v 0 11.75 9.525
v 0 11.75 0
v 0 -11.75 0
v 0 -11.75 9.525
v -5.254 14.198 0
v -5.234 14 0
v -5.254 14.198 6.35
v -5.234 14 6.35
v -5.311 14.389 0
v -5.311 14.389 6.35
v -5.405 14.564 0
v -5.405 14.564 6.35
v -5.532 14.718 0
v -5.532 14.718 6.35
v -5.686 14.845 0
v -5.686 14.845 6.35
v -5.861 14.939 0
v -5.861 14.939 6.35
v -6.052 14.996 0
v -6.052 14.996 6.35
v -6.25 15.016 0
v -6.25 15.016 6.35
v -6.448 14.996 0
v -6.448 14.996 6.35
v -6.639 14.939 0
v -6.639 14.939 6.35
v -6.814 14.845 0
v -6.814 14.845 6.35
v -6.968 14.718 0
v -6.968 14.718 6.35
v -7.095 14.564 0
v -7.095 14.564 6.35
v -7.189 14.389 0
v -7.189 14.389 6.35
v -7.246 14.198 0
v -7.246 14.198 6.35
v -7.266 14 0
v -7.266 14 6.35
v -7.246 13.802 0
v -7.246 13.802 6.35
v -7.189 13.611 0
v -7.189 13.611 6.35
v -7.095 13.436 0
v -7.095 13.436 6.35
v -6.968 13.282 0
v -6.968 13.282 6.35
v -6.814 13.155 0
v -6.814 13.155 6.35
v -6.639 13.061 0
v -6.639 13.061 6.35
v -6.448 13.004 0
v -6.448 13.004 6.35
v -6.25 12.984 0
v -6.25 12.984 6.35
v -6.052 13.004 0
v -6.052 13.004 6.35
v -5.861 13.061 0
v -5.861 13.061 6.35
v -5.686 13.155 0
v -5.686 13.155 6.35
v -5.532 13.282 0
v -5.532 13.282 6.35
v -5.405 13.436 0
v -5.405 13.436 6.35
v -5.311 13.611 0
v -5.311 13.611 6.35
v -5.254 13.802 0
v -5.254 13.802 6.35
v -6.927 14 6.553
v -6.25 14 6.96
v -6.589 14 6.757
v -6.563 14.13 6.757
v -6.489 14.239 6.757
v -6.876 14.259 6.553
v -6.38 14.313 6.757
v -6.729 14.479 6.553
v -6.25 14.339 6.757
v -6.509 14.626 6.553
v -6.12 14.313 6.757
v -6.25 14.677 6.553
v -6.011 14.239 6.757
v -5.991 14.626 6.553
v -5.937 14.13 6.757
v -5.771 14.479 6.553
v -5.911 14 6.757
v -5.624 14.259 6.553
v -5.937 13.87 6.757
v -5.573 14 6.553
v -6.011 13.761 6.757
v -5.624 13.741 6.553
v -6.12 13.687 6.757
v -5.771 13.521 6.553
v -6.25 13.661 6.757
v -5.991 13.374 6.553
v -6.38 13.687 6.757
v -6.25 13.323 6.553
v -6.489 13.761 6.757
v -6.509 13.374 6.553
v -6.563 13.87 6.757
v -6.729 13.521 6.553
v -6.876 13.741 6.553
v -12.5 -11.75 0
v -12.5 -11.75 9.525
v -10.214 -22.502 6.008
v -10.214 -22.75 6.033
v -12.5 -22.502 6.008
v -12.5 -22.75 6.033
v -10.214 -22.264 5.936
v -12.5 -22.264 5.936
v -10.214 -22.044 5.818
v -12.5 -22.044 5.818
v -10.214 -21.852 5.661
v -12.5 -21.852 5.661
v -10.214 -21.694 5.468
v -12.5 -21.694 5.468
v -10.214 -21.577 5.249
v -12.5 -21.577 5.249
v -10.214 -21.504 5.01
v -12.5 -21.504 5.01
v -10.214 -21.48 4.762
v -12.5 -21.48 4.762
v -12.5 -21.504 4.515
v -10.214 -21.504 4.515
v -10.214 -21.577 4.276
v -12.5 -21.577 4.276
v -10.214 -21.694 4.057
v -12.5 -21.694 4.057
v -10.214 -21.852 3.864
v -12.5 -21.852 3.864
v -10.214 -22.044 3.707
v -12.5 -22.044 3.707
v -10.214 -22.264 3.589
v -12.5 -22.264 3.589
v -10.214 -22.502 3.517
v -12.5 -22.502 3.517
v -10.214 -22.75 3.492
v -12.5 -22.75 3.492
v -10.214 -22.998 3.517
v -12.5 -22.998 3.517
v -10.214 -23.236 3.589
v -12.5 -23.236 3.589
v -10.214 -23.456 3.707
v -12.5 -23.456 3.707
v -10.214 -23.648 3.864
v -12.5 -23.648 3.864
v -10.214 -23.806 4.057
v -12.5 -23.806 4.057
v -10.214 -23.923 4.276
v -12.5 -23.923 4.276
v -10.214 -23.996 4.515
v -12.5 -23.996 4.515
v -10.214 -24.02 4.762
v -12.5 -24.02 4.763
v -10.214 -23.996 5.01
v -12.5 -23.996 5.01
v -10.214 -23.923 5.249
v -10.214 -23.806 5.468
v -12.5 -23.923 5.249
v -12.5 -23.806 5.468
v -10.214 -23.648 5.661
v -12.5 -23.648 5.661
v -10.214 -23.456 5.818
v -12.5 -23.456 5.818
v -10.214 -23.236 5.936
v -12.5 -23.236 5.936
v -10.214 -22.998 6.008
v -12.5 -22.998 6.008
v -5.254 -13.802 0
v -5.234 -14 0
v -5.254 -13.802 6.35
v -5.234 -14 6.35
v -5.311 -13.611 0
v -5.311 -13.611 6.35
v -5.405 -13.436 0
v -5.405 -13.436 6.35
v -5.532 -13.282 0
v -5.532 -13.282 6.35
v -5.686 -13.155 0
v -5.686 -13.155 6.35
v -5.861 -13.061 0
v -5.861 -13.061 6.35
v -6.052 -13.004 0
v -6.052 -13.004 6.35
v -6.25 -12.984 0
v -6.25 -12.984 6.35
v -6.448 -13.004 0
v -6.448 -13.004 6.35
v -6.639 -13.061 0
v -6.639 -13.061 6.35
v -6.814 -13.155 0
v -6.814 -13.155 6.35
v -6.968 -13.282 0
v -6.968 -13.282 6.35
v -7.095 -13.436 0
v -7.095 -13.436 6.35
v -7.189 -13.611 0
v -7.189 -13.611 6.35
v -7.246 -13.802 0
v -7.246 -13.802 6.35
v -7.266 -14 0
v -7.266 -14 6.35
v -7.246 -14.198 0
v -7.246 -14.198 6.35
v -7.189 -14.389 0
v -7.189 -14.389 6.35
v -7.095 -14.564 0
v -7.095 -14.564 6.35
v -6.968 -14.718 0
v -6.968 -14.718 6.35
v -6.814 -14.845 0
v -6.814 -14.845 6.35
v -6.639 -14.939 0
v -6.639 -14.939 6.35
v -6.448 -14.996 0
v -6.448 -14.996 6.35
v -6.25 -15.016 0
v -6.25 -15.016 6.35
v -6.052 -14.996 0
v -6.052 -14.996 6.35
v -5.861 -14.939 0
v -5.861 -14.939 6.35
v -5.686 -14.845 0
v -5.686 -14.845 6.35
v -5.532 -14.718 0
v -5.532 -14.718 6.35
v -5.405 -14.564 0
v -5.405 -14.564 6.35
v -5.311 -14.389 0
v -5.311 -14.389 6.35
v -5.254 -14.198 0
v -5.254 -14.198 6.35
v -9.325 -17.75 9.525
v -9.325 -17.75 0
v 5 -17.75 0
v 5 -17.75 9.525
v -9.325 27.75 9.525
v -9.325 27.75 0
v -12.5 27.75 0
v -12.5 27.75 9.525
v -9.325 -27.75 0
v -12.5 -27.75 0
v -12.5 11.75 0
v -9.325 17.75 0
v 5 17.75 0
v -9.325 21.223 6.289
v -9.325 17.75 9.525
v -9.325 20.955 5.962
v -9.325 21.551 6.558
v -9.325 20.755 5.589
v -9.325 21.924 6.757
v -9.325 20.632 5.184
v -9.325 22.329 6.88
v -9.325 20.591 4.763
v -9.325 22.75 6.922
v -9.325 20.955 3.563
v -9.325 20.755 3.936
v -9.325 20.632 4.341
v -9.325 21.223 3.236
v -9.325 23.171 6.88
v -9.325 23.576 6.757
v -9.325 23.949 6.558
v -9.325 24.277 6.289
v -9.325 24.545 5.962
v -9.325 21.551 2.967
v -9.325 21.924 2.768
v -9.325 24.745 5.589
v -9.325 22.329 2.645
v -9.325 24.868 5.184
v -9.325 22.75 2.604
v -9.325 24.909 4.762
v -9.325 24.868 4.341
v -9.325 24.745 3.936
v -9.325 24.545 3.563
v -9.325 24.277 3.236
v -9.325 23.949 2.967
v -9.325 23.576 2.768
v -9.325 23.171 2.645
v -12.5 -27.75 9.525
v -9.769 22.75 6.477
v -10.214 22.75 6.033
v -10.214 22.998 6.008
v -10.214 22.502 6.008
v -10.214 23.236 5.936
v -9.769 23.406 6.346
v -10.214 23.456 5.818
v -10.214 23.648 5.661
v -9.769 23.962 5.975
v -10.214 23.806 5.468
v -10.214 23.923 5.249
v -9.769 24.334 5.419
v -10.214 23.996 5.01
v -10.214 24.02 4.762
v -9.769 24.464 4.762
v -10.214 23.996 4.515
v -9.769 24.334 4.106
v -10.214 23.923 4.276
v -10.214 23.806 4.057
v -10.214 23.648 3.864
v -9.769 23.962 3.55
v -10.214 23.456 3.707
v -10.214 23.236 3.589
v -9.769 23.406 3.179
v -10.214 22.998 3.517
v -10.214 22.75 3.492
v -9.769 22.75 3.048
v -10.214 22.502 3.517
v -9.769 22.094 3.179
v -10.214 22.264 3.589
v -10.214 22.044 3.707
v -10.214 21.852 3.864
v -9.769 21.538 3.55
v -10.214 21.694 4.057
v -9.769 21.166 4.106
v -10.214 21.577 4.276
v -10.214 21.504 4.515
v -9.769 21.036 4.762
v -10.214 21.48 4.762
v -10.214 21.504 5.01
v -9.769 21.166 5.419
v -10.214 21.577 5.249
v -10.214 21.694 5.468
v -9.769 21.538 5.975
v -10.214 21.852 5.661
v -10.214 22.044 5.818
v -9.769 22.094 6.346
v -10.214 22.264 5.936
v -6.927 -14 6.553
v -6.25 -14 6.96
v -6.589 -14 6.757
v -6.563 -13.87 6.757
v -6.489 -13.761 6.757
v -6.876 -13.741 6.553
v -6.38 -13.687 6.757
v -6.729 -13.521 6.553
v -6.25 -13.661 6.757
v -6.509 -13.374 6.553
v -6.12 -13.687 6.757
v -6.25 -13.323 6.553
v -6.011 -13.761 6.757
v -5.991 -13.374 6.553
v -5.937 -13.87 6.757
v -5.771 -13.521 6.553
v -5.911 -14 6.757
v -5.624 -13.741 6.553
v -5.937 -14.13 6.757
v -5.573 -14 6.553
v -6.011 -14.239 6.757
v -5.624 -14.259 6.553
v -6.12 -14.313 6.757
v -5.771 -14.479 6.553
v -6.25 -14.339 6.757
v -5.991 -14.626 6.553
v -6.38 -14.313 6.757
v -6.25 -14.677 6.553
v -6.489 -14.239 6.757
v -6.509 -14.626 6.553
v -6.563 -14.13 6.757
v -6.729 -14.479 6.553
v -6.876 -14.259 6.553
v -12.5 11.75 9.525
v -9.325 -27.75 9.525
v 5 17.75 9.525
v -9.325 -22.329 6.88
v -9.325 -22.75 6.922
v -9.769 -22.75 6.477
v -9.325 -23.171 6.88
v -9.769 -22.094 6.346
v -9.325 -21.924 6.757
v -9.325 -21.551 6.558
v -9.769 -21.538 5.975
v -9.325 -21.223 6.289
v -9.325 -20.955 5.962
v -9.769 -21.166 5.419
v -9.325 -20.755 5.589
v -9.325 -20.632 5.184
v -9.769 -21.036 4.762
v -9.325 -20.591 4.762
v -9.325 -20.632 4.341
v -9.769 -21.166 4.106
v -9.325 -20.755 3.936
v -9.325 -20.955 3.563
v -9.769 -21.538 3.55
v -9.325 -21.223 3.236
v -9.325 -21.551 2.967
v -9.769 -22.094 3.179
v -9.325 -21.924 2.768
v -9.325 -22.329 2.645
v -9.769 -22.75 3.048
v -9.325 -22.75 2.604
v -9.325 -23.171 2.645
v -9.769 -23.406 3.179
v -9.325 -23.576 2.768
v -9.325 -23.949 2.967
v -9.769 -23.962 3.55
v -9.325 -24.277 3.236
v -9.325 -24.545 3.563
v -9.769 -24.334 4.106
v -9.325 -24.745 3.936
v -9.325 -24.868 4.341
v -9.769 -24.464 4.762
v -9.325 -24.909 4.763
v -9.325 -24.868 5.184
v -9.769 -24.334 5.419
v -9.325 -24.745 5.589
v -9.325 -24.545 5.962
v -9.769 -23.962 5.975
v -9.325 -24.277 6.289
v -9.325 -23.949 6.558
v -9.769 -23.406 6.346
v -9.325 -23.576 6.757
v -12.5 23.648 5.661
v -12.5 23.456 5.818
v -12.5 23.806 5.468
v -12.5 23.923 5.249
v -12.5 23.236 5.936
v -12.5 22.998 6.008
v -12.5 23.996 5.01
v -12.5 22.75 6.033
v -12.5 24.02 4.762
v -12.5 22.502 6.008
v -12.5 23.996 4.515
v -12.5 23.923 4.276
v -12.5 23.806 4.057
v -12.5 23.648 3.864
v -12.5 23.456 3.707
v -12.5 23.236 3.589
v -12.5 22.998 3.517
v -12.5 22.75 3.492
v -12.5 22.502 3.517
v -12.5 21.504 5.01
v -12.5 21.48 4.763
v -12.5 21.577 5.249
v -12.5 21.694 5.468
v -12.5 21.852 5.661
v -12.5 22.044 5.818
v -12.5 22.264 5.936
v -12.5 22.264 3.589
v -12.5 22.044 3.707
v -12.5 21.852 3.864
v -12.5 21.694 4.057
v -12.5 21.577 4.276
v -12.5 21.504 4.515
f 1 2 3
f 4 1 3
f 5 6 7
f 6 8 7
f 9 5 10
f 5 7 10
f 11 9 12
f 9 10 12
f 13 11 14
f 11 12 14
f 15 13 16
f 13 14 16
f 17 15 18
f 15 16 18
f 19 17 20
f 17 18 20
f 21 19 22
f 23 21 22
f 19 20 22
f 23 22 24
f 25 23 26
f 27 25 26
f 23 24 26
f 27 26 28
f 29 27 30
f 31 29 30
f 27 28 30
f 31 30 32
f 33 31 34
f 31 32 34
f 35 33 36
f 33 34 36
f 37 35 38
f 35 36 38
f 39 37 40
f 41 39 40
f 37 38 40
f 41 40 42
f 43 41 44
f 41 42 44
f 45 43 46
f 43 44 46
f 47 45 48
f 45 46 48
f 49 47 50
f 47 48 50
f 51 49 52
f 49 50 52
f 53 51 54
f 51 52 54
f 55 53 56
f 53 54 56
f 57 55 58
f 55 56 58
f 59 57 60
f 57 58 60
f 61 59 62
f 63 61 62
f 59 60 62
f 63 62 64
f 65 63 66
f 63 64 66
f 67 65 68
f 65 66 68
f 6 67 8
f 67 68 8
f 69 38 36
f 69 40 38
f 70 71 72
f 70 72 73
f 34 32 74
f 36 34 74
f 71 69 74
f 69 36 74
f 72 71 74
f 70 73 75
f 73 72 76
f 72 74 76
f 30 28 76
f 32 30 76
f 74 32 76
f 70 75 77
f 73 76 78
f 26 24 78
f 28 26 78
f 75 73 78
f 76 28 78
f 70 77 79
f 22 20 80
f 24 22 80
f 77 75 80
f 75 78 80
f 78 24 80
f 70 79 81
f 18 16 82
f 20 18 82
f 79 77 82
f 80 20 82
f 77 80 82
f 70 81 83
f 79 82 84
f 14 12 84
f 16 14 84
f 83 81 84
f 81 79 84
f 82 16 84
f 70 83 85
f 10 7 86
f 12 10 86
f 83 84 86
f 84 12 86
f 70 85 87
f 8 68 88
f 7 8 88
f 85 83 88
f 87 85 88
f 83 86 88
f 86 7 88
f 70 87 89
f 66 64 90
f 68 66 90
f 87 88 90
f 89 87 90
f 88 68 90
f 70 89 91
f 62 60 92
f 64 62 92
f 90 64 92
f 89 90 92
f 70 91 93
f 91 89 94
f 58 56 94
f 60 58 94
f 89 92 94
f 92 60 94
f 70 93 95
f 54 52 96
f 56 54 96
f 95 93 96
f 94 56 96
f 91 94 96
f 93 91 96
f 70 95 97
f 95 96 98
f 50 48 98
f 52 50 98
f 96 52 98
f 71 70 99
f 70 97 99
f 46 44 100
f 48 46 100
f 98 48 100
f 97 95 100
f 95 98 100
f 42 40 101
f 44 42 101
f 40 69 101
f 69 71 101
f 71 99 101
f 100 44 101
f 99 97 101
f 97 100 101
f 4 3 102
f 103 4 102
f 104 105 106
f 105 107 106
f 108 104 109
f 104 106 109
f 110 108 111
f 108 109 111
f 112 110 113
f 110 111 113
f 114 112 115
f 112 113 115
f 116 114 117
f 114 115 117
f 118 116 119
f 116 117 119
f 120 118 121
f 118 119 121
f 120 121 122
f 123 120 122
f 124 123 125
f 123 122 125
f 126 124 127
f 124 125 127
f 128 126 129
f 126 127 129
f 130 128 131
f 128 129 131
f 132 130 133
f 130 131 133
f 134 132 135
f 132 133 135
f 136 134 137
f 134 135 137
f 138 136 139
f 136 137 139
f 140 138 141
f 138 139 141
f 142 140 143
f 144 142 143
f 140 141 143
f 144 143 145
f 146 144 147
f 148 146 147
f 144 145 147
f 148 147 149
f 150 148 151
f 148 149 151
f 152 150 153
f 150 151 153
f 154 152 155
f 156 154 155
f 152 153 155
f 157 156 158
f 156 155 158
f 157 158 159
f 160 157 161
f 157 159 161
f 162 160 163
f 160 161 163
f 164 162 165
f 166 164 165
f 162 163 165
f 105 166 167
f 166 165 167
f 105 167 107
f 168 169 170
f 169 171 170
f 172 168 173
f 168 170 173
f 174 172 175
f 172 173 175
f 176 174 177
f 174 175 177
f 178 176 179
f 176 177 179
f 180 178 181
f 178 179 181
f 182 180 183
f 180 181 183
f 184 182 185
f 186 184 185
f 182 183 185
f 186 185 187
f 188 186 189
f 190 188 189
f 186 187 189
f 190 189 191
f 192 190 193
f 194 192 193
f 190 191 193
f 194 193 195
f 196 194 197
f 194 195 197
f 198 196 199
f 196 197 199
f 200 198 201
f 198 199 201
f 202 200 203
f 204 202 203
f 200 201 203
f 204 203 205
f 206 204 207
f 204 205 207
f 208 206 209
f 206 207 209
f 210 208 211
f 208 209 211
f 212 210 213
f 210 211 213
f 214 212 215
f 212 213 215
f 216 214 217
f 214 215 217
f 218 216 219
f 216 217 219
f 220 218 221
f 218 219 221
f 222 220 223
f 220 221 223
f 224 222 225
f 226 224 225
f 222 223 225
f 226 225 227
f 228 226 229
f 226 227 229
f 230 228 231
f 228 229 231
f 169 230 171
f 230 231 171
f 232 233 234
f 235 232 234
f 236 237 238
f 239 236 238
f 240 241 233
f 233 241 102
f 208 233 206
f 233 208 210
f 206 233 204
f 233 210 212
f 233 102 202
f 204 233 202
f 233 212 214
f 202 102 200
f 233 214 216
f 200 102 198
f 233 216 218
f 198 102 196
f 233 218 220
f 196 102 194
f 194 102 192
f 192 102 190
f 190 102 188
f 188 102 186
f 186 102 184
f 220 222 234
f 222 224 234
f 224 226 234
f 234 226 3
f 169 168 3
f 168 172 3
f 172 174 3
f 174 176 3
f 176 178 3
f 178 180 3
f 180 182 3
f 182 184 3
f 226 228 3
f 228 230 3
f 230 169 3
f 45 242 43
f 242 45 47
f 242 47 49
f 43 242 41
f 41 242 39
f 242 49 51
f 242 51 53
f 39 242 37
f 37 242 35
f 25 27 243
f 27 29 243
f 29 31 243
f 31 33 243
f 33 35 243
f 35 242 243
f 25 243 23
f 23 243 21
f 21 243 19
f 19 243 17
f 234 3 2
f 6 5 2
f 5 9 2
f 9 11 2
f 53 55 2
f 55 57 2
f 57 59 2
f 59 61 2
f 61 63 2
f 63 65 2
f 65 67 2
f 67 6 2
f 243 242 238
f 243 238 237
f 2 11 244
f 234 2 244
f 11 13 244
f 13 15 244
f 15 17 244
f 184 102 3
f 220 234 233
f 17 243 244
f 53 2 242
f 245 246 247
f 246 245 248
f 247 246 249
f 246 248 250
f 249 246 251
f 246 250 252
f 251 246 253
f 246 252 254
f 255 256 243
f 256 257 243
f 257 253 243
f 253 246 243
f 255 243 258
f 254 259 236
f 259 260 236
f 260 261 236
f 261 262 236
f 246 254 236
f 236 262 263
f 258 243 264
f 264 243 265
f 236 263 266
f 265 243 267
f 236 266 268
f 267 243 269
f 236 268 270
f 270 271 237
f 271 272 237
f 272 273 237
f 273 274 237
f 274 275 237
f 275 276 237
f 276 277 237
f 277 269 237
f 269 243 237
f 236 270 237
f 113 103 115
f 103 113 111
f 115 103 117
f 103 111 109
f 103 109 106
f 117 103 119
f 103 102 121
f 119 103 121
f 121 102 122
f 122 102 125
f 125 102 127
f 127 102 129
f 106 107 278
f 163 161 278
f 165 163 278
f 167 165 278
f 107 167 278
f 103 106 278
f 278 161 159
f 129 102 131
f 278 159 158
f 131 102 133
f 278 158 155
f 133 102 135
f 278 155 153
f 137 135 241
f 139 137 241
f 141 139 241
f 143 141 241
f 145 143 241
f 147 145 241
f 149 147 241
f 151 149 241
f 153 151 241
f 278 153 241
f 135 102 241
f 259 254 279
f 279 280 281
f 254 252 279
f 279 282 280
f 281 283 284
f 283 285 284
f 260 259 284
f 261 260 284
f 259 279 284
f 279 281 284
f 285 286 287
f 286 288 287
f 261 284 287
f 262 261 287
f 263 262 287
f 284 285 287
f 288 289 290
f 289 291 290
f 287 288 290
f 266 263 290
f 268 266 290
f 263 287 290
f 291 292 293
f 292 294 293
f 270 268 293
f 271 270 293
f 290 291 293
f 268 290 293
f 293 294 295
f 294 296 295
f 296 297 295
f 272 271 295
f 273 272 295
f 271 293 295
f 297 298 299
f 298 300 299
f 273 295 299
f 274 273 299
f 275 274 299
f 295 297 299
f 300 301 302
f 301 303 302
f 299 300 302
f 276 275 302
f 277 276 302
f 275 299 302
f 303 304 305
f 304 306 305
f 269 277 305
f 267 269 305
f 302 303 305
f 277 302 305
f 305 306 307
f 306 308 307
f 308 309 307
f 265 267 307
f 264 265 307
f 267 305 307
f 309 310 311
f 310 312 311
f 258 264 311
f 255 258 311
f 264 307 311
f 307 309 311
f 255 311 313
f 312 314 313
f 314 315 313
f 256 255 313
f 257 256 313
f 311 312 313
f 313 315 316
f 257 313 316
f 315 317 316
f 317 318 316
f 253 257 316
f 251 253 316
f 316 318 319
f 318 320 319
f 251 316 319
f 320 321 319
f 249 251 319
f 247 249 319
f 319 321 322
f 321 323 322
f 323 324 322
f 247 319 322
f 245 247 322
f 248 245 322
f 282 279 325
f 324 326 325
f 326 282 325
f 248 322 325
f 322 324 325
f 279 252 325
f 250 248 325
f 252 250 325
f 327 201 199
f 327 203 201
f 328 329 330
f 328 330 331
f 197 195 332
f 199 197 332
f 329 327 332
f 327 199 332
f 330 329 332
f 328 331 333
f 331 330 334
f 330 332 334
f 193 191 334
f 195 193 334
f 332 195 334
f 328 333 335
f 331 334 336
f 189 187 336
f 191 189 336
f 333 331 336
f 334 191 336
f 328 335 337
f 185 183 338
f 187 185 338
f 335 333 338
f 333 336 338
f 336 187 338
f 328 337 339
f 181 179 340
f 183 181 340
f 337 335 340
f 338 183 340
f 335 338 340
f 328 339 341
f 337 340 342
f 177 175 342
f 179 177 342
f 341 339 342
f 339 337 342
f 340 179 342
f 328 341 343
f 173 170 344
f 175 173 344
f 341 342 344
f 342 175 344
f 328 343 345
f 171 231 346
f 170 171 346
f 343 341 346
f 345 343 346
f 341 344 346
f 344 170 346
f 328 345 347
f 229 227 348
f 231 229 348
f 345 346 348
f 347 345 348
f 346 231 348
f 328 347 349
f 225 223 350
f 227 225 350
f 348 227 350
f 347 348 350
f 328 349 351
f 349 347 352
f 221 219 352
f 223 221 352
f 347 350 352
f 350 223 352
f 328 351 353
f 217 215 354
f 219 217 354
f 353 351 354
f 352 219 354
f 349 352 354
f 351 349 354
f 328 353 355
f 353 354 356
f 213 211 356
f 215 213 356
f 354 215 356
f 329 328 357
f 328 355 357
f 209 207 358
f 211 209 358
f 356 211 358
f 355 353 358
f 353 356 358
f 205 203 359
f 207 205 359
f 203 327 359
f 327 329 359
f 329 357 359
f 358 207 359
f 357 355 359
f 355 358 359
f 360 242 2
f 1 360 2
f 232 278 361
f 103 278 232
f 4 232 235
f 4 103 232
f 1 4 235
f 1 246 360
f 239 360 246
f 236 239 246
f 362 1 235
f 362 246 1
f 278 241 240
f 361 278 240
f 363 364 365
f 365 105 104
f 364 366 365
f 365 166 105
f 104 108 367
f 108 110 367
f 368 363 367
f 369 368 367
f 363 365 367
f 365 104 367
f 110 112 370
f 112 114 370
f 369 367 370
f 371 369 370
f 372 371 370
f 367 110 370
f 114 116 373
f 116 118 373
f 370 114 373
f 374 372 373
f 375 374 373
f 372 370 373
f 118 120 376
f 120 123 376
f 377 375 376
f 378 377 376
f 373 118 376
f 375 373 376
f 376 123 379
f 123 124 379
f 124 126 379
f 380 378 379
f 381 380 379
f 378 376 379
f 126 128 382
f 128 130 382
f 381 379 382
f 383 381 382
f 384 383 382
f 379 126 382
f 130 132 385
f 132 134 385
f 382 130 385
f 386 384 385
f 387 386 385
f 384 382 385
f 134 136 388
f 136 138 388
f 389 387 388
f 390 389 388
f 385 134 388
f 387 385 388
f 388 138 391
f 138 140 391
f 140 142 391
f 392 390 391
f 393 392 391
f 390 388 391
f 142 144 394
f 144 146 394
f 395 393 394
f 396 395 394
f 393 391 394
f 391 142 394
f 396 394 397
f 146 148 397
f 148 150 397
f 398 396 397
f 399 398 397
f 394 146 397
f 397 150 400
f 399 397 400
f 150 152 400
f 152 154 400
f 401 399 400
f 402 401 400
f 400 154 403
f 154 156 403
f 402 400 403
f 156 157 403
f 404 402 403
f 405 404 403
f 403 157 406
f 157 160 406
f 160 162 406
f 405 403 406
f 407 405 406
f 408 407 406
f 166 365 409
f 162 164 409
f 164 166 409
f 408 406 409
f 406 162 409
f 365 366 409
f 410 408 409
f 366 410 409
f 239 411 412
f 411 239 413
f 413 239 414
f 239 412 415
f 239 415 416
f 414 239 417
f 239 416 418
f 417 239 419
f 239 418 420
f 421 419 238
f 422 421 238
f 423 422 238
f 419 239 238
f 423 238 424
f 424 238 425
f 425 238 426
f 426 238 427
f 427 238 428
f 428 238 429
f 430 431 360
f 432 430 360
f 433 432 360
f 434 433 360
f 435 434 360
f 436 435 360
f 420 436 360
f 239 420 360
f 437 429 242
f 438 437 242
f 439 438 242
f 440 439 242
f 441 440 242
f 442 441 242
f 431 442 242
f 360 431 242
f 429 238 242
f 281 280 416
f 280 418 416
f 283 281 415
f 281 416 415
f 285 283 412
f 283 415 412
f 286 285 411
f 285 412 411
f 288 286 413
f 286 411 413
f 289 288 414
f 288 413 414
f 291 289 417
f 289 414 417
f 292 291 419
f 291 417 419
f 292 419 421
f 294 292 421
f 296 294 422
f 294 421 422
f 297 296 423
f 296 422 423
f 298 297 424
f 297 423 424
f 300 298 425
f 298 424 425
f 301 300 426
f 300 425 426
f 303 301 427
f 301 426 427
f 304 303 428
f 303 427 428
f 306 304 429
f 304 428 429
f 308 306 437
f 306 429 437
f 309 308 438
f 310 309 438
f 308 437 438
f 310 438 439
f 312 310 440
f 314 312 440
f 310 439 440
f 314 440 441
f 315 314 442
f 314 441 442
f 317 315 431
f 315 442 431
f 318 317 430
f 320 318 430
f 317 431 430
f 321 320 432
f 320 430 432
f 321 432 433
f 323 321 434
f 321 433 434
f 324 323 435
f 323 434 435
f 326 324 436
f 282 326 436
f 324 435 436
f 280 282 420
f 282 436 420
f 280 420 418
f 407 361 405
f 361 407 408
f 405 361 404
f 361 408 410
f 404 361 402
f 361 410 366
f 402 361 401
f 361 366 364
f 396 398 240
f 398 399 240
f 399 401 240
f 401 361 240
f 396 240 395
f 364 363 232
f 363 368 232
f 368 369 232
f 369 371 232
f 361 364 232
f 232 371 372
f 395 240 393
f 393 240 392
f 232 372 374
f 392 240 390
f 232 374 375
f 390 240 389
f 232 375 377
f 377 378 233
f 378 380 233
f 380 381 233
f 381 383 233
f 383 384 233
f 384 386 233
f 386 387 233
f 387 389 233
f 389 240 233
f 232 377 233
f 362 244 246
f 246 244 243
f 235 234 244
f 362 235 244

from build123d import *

# Parameters (mm, degrees)
BOSS_EXTRUDE1_DEPTH             = 9.525
F_2_CLEARANCE_HOLE1_D           = 2.032
F_2_CLEARANCE_HOLE1_DEPTH       = 6.35
F_2_CLEARANCE_HOLE1_TIP         = 0.610474389
F_3_CLEARANCE_HOLE2_D           = 2.54
F_3_CLEARANCE_HOLE2_CSINK_D     = 4.318
F_3_CLEARANCE_HOLE2_CSINK_ANGLE = 90


with BuildPart() as part:
    # Sketch1 → Boss-Extrude1 (new body)
    with BuildSketch(Plane.XY):
        Polygon((0, 11.75), (0, -11.75), (-12.5, -11.75), (-12.5, -27.75), (-9.325, -27.75), (-9.325, -17.75), (5, -17.75), (5, 17.75), (-9.325, 17.75), (-9.325, 27.75), (-12.5, 27.75), (-12.5, 11.75), align=None)
    extrude(amount=BOSS_EXTRUDE1_DEPTH)

    # #2 Clearance Hole1
    with Locations(Plane(origin=(0, 0, 0), x_dir=(-1, 0, 0), z_dir=(0, 0, -1))):
        with Locations((6.25, 14), (6.25, -14)):
            Hole(F_2_CLEARANCE_HOLE1_D / 2, depth=F_2_CLEARANCE_HOLE1_DEPTH)
            with Locations((0, 0, -(F_2_CLEARANCE_HOLE1_DEPTH + F_2_CLEARANCE_HOLE1_TIP / 2))):  # 118° drill point
                Cone(0, F_2_CLEARANCE_HOLE1_D / 2, F_2_CLEARANCE_HOLE1_TIP, mode=Mode.SUBTRACT)

    # #3 Clearance Hole2 (through all)
    with Locations(Plane(origin=(-9.325, 0, 0), x_dir=(0, 0, -1), z_dir=(1, 0, 0))):
        with Locations((-4.7625, 22.75), (-4.7625, -22.75)):
            CounterSinkHole(F_3_CLEARANCE_HOLE2_D / 2, F_3_CLEARANCE_HOLE2_CSINK_D / 2, counter_sink_angle=F_3_CLEARANCE_HOLE2_CSINK_ANGLE)


solid = part.part
